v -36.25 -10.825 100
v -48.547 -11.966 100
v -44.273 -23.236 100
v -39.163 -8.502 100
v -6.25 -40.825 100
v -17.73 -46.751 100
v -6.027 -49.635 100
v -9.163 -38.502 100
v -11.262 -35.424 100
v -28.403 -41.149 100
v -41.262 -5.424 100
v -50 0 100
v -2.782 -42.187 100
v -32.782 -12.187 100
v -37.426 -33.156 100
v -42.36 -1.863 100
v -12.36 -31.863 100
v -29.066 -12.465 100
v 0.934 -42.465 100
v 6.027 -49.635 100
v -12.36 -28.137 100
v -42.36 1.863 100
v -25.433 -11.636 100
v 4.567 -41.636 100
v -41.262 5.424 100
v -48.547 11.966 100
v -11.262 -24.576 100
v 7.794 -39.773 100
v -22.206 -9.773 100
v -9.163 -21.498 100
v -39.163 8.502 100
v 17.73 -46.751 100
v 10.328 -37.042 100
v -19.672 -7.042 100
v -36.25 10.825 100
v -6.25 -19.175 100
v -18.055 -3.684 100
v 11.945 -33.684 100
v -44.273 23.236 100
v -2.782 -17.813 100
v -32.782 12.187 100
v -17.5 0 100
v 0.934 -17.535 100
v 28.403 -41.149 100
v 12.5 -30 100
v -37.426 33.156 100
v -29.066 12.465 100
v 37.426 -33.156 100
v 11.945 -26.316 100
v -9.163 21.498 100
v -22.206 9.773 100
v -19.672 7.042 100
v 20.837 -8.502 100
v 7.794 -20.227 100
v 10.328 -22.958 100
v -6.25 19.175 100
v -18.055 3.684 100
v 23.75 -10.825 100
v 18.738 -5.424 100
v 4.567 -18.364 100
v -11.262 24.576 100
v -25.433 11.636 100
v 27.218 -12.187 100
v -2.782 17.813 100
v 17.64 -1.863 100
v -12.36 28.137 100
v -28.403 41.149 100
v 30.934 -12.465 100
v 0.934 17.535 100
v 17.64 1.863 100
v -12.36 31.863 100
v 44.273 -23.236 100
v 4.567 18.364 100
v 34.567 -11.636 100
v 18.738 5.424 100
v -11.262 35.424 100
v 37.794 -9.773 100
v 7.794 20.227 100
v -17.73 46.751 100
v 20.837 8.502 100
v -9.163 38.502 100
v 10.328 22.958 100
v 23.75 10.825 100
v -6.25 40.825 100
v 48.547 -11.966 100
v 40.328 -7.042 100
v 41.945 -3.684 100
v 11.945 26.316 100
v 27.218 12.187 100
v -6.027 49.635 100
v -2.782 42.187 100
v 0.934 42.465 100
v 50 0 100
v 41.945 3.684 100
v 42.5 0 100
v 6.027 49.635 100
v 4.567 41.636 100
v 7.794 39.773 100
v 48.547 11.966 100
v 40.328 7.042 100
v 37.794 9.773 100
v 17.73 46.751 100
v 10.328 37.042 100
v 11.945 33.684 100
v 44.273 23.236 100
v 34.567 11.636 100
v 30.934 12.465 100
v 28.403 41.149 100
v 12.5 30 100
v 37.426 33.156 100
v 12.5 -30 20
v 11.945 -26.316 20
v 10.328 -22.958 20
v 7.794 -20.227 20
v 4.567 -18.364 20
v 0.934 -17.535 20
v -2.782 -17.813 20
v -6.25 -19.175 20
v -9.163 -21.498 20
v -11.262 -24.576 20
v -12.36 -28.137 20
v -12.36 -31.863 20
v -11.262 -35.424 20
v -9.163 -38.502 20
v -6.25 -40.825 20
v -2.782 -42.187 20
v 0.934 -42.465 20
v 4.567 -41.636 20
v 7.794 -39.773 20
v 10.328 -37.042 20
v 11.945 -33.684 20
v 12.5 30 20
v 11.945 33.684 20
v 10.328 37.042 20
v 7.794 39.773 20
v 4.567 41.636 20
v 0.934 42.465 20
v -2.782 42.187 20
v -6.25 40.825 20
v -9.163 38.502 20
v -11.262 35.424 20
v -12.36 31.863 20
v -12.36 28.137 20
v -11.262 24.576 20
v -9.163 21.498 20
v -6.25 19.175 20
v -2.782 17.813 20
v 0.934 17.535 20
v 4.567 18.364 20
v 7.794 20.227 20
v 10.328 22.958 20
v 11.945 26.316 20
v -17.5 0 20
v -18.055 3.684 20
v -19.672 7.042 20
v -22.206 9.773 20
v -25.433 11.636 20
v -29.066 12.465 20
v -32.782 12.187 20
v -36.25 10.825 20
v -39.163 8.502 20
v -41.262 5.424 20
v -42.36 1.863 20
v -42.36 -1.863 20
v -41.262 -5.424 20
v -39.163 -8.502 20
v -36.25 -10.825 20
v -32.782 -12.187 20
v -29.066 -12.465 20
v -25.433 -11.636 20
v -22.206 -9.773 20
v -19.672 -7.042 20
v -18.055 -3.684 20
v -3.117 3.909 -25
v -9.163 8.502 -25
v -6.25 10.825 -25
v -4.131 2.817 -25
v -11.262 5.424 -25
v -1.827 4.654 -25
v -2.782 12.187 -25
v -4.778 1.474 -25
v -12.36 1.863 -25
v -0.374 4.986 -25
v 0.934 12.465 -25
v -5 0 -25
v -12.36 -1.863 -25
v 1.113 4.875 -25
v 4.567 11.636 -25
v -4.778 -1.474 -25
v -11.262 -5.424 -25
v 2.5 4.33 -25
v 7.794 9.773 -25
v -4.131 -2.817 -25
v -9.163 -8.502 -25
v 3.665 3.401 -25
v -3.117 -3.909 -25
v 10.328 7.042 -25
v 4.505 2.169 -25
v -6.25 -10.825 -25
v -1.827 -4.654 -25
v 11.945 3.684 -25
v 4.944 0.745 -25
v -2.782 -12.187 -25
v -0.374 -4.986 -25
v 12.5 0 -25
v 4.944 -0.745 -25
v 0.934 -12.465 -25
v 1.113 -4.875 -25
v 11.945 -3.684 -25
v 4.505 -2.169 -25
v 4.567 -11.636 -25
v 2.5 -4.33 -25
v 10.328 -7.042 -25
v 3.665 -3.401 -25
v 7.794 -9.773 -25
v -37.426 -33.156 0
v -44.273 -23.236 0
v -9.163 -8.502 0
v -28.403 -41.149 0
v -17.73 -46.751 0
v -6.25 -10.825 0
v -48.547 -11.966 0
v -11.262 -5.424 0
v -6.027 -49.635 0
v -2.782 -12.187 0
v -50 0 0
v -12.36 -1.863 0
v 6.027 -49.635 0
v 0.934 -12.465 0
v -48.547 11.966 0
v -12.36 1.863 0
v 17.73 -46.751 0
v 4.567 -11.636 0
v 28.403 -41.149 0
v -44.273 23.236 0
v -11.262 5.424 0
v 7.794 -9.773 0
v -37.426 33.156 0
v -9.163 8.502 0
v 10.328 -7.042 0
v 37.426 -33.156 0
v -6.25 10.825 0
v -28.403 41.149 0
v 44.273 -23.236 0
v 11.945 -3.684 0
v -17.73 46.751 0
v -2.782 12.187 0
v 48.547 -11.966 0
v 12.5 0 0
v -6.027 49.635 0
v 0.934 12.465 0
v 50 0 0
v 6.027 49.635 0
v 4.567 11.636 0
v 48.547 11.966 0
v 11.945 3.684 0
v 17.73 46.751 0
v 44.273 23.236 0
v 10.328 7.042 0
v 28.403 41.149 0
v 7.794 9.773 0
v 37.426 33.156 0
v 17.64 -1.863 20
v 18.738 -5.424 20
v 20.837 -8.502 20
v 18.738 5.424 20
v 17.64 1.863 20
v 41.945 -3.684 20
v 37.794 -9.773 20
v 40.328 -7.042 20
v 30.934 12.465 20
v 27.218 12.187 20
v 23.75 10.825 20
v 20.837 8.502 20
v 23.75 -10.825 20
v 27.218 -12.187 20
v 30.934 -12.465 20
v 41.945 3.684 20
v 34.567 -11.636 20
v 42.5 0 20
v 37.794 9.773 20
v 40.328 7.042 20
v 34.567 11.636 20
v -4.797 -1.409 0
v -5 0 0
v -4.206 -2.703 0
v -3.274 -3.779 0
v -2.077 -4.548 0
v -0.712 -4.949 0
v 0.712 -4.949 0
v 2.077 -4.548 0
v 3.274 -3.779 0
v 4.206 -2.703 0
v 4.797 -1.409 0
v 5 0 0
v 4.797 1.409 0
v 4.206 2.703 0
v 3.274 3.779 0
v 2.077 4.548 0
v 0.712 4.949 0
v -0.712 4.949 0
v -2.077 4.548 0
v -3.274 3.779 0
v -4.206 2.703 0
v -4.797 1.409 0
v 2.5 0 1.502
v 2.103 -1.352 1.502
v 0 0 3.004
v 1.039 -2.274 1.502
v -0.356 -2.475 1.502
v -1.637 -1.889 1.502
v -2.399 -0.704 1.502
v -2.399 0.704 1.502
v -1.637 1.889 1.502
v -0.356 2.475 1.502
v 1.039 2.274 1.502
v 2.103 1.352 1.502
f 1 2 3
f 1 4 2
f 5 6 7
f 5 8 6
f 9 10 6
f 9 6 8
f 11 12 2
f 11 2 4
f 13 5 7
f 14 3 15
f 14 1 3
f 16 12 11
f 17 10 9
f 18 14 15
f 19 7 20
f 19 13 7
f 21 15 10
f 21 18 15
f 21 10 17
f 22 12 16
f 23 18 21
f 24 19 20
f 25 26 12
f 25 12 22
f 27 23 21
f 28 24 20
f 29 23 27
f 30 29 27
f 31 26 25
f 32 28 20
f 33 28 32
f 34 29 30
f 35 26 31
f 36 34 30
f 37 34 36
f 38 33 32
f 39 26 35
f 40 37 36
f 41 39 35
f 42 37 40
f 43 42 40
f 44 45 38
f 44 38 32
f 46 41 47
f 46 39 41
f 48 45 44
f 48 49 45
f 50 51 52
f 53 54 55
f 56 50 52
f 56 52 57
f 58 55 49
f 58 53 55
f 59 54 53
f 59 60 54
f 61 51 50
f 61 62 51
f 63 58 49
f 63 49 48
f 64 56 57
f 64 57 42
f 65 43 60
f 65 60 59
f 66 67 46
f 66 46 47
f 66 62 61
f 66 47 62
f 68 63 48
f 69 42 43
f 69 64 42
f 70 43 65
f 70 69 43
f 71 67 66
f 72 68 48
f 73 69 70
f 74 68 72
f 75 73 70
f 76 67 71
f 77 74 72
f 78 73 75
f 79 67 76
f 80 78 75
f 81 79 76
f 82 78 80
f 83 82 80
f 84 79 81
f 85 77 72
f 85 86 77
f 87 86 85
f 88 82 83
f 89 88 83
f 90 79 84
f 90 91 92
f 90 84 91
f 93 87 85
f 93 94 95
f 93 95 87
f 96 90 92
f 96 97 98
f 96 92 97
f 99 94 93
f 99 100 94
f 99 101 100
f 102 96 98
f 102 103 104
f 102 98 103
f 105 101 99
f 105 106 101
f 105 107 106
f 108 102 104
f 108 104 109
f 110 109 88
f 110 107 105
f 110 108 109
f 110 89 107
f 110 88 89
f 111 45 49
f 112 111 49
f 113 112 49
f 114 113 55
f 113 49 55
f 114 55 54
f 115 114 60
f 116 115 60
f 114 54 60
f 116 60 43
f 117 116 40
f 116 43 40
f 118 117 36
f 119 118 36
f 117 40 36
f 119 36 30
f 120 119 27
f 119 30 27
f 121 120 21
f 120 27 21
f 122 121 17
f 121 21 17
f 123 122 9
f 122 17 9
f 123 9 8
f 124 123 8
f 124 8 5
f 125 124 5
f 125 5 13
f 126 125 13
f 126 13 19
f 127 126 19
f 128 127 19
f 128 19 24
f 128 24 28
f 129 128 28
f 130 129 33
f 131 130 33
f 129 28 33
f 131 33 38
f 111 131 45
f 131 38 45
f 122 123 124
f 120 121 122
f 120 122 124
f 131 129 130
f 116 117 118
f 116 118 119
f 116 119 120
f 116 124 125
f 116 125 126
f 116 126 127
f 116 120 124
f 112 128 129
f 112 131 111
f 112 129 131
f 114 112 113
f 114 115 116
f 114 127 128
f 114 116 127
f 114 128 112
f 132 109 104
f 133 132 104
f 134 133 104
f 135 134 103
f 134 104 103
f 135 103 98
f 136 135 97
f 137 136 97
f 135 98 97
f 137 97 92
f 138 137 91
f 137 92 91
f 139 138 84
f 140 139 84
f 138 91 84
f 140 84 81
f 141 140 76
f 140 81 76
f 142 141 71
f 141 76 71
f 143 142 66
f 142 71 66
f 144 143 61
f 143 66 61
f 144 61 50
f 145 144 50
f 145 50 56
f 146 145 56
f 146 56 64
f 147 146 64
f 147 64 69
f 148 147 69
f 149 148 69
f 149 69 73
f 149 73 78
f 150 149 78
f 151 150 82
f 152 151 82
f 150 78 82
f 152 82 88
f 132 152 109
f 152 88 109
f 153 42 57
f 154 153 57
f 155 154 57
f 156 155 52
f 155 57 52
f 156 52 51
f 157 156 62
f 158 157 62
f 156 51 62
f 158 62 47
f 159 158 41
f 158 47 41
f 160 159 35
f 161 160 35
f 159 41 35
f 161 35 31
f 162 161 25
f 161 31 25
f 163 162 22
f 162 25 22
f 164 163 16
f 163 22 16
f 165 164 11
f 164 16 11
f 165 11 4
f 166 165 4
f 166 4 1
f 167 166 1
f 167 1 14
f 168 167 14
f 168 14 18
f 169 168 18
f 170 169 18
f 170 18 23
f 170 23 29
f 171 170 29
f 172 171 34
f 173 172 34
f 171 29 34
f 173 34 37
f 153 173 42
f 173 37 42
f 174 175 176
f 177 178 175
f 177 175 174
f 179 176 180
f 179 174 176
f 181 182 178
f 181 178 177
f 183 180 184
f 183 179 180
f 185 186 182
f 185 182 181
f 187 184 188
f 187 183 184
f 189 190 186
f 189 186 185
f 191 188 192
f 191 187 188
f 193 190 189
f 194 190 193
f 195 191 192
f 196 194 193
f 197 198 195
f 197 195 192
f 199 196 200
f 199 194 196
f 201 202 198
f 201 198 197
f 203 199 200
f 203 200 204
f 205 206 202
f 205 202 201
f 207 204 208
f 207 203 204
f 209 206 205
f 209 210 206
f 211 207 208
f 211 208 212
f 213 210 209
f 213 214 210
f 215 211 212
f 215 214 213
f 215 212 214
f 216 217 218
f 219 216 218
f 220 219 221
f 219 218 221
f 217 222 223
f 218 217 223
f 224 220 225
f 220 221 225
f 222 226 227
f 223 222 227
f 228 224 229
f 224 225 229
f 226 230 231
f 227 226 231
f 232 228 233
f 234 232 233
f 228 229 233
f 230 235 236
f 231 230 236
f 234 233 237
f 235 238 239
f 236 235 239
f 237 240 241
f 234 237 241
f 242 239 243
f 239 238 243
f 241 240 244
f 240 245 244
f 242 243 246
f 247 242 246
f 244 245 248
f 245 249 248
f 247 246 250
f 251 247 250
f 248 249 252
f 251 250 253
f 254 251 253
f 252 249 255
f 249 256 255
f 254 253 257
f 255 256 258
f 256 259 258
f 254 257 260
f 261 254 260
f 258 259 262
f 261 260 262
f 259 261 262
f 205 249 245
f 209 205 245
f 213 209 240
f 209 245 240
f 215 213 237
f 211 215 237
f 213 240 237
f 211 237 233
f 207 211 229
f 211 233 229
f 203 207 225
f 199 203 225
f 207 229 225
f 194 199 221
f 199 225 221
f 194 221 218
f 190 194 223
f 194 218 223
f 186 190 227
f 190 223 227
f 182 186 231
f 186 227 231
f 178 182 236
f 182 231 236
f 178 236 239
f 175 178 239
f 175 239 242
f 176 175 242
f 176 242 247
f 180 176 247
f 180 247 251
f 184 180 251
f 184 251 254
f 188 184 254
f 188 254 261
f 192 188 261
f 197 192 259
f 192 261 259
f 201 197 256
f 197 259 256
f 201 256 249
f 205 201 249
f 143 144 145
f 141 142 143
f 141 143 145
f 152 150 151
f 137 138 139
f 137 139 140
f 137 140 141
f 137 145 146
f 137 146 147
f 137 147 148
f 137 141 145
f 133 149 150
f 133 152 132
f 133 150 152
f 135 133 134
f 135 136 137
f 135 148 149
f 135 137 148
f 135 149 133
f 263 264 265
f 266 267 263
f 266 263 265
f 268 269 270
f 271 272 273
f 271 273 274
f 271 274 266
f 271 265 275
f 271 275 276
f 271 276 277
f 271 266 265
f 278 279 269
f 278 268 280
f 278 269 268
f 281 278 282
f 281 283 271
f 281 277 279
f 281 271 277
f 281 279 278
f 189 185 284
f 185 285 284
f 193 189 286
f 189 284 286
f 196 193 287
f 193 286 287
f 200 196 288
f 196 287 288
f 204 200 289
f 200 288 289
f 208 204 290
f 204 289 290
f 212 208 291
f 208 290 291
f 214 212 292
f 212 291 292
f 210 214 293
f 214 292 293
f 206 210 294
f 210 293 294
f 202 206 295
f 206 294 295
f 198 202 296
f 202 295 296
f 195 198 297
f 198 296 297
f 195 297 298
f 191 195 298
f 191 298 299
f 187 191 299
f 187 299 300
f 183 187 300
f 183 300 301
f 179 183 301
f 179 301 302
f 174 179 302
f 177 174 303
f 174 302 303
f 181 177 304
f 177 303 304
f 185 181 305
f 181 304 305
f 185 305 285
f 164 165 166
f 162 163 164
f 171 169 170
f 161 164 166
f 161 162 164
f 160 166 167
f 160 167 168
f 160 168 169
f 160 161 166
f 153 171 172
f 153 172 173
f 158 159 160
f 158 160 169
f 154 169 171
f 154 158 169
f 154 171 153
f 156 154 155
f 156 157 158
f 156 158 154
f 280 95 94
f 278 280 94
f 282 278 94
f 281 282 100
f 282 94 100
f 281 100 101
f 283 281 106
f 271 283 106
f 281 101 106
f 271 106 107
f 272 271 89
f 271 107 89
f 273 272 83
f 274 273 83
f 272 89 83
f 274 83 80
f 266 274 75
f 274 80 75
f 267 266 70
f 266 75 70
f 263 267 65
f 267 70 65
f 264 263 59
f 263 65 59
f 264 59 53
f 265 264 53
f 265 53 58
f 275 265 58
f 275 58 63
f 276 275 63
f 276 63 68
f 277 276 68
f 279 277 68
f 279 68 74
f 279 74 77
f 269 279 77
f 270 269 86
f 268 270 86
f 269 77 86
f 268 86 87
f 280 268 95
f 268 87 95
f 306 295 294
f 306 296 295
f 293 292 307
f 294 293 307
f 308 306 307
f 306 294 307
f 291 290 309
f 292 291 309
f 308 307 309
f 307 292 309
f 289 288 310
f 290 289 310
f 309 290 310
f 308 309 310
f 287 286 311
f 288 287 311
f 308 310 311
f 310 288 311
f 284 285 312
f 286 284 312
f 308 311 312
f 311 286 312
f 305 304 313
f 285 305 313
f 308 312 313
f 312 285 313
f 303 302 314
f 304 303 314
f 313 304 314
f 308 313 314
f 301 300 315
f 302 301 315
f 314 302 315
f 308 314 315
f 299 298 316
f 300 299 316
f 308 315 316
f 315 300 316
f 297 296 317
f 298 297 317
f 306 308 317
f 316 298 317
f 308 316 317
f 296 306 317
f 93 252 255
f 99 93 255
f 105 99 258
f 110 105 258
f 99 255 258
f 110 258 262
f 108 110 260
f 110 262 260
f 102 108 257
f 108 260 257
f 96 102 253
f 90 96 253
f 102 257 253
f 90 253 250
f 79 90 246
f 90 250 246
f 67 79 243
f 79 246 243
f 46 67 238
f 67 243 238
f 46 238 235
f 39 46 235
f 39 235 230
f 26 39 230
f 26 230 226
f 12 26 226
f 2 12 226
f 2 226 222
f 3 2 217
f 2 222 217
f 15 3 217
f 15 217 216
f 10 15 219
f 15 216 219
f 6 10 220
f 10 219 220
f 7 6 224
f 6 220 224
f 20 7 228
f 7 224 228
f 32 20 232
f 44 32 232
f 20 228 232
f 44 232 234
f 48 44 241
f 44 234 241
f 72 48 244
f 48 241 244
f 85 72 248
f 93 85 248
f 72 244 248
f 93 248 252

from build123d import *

# Parameters (mm, degrees)
F0_R     = 50
F1_DEPTH = 100
F2_R     = 12.5
F3_DEPTH = 25
F5_D     = 10
F5_DEPTH = 25
F5_TIP   = 3.0043030951
F6_R     = 12.5
F7_DEPTH = 80


with BuildPart() as f1:
    # F0 (on Top) → F1 (new body)
    with BuildSketch(Plane.XY):
        Circle(F0_R)
    extrude(amount=F1_DEPTH)

    # F2 (on face) → F3 (join)
    with BuildSketch(Plane(origin=(0, 0, 0), x_dir=(1, 0, 0), z_dir=(0, 0, -1))):
        Circle(F2_R)
    extrude(amount=F3_DEPTH)

    # F5
    with Locations(Plane(origin=(0, 0, -25), x_dir=(1, 0, 0), z_dir=(0, 0, -1))):
        with Locations((0, 0)):
            Hole(F5_D / 2, depth=F5_DEPTH)
            with Locations((0, 0, -(F5_DEPTH + F5_TIP / 2))):  # 118° drill point
                Cone(0, F5_D / 2, F5_TIP, mode=Mode.SUBTRACT)

    # F6 (on face) → F7 (cut)
    with BuildSketch(Plane.XY.offset(100)):
        with Locations((-30, 0)):
            Circle(F6_R)
        with Locations((0, -30)):
            Circle(F6_R)
        with Locations((30, 0)):
            Circle(F6_R)
        with Locations((0, 30)):
            Circle(F6_R)
    extrude(amount=-F7_DEPTH, mode=Mode.SUBTRACT)


solid = f1.part
